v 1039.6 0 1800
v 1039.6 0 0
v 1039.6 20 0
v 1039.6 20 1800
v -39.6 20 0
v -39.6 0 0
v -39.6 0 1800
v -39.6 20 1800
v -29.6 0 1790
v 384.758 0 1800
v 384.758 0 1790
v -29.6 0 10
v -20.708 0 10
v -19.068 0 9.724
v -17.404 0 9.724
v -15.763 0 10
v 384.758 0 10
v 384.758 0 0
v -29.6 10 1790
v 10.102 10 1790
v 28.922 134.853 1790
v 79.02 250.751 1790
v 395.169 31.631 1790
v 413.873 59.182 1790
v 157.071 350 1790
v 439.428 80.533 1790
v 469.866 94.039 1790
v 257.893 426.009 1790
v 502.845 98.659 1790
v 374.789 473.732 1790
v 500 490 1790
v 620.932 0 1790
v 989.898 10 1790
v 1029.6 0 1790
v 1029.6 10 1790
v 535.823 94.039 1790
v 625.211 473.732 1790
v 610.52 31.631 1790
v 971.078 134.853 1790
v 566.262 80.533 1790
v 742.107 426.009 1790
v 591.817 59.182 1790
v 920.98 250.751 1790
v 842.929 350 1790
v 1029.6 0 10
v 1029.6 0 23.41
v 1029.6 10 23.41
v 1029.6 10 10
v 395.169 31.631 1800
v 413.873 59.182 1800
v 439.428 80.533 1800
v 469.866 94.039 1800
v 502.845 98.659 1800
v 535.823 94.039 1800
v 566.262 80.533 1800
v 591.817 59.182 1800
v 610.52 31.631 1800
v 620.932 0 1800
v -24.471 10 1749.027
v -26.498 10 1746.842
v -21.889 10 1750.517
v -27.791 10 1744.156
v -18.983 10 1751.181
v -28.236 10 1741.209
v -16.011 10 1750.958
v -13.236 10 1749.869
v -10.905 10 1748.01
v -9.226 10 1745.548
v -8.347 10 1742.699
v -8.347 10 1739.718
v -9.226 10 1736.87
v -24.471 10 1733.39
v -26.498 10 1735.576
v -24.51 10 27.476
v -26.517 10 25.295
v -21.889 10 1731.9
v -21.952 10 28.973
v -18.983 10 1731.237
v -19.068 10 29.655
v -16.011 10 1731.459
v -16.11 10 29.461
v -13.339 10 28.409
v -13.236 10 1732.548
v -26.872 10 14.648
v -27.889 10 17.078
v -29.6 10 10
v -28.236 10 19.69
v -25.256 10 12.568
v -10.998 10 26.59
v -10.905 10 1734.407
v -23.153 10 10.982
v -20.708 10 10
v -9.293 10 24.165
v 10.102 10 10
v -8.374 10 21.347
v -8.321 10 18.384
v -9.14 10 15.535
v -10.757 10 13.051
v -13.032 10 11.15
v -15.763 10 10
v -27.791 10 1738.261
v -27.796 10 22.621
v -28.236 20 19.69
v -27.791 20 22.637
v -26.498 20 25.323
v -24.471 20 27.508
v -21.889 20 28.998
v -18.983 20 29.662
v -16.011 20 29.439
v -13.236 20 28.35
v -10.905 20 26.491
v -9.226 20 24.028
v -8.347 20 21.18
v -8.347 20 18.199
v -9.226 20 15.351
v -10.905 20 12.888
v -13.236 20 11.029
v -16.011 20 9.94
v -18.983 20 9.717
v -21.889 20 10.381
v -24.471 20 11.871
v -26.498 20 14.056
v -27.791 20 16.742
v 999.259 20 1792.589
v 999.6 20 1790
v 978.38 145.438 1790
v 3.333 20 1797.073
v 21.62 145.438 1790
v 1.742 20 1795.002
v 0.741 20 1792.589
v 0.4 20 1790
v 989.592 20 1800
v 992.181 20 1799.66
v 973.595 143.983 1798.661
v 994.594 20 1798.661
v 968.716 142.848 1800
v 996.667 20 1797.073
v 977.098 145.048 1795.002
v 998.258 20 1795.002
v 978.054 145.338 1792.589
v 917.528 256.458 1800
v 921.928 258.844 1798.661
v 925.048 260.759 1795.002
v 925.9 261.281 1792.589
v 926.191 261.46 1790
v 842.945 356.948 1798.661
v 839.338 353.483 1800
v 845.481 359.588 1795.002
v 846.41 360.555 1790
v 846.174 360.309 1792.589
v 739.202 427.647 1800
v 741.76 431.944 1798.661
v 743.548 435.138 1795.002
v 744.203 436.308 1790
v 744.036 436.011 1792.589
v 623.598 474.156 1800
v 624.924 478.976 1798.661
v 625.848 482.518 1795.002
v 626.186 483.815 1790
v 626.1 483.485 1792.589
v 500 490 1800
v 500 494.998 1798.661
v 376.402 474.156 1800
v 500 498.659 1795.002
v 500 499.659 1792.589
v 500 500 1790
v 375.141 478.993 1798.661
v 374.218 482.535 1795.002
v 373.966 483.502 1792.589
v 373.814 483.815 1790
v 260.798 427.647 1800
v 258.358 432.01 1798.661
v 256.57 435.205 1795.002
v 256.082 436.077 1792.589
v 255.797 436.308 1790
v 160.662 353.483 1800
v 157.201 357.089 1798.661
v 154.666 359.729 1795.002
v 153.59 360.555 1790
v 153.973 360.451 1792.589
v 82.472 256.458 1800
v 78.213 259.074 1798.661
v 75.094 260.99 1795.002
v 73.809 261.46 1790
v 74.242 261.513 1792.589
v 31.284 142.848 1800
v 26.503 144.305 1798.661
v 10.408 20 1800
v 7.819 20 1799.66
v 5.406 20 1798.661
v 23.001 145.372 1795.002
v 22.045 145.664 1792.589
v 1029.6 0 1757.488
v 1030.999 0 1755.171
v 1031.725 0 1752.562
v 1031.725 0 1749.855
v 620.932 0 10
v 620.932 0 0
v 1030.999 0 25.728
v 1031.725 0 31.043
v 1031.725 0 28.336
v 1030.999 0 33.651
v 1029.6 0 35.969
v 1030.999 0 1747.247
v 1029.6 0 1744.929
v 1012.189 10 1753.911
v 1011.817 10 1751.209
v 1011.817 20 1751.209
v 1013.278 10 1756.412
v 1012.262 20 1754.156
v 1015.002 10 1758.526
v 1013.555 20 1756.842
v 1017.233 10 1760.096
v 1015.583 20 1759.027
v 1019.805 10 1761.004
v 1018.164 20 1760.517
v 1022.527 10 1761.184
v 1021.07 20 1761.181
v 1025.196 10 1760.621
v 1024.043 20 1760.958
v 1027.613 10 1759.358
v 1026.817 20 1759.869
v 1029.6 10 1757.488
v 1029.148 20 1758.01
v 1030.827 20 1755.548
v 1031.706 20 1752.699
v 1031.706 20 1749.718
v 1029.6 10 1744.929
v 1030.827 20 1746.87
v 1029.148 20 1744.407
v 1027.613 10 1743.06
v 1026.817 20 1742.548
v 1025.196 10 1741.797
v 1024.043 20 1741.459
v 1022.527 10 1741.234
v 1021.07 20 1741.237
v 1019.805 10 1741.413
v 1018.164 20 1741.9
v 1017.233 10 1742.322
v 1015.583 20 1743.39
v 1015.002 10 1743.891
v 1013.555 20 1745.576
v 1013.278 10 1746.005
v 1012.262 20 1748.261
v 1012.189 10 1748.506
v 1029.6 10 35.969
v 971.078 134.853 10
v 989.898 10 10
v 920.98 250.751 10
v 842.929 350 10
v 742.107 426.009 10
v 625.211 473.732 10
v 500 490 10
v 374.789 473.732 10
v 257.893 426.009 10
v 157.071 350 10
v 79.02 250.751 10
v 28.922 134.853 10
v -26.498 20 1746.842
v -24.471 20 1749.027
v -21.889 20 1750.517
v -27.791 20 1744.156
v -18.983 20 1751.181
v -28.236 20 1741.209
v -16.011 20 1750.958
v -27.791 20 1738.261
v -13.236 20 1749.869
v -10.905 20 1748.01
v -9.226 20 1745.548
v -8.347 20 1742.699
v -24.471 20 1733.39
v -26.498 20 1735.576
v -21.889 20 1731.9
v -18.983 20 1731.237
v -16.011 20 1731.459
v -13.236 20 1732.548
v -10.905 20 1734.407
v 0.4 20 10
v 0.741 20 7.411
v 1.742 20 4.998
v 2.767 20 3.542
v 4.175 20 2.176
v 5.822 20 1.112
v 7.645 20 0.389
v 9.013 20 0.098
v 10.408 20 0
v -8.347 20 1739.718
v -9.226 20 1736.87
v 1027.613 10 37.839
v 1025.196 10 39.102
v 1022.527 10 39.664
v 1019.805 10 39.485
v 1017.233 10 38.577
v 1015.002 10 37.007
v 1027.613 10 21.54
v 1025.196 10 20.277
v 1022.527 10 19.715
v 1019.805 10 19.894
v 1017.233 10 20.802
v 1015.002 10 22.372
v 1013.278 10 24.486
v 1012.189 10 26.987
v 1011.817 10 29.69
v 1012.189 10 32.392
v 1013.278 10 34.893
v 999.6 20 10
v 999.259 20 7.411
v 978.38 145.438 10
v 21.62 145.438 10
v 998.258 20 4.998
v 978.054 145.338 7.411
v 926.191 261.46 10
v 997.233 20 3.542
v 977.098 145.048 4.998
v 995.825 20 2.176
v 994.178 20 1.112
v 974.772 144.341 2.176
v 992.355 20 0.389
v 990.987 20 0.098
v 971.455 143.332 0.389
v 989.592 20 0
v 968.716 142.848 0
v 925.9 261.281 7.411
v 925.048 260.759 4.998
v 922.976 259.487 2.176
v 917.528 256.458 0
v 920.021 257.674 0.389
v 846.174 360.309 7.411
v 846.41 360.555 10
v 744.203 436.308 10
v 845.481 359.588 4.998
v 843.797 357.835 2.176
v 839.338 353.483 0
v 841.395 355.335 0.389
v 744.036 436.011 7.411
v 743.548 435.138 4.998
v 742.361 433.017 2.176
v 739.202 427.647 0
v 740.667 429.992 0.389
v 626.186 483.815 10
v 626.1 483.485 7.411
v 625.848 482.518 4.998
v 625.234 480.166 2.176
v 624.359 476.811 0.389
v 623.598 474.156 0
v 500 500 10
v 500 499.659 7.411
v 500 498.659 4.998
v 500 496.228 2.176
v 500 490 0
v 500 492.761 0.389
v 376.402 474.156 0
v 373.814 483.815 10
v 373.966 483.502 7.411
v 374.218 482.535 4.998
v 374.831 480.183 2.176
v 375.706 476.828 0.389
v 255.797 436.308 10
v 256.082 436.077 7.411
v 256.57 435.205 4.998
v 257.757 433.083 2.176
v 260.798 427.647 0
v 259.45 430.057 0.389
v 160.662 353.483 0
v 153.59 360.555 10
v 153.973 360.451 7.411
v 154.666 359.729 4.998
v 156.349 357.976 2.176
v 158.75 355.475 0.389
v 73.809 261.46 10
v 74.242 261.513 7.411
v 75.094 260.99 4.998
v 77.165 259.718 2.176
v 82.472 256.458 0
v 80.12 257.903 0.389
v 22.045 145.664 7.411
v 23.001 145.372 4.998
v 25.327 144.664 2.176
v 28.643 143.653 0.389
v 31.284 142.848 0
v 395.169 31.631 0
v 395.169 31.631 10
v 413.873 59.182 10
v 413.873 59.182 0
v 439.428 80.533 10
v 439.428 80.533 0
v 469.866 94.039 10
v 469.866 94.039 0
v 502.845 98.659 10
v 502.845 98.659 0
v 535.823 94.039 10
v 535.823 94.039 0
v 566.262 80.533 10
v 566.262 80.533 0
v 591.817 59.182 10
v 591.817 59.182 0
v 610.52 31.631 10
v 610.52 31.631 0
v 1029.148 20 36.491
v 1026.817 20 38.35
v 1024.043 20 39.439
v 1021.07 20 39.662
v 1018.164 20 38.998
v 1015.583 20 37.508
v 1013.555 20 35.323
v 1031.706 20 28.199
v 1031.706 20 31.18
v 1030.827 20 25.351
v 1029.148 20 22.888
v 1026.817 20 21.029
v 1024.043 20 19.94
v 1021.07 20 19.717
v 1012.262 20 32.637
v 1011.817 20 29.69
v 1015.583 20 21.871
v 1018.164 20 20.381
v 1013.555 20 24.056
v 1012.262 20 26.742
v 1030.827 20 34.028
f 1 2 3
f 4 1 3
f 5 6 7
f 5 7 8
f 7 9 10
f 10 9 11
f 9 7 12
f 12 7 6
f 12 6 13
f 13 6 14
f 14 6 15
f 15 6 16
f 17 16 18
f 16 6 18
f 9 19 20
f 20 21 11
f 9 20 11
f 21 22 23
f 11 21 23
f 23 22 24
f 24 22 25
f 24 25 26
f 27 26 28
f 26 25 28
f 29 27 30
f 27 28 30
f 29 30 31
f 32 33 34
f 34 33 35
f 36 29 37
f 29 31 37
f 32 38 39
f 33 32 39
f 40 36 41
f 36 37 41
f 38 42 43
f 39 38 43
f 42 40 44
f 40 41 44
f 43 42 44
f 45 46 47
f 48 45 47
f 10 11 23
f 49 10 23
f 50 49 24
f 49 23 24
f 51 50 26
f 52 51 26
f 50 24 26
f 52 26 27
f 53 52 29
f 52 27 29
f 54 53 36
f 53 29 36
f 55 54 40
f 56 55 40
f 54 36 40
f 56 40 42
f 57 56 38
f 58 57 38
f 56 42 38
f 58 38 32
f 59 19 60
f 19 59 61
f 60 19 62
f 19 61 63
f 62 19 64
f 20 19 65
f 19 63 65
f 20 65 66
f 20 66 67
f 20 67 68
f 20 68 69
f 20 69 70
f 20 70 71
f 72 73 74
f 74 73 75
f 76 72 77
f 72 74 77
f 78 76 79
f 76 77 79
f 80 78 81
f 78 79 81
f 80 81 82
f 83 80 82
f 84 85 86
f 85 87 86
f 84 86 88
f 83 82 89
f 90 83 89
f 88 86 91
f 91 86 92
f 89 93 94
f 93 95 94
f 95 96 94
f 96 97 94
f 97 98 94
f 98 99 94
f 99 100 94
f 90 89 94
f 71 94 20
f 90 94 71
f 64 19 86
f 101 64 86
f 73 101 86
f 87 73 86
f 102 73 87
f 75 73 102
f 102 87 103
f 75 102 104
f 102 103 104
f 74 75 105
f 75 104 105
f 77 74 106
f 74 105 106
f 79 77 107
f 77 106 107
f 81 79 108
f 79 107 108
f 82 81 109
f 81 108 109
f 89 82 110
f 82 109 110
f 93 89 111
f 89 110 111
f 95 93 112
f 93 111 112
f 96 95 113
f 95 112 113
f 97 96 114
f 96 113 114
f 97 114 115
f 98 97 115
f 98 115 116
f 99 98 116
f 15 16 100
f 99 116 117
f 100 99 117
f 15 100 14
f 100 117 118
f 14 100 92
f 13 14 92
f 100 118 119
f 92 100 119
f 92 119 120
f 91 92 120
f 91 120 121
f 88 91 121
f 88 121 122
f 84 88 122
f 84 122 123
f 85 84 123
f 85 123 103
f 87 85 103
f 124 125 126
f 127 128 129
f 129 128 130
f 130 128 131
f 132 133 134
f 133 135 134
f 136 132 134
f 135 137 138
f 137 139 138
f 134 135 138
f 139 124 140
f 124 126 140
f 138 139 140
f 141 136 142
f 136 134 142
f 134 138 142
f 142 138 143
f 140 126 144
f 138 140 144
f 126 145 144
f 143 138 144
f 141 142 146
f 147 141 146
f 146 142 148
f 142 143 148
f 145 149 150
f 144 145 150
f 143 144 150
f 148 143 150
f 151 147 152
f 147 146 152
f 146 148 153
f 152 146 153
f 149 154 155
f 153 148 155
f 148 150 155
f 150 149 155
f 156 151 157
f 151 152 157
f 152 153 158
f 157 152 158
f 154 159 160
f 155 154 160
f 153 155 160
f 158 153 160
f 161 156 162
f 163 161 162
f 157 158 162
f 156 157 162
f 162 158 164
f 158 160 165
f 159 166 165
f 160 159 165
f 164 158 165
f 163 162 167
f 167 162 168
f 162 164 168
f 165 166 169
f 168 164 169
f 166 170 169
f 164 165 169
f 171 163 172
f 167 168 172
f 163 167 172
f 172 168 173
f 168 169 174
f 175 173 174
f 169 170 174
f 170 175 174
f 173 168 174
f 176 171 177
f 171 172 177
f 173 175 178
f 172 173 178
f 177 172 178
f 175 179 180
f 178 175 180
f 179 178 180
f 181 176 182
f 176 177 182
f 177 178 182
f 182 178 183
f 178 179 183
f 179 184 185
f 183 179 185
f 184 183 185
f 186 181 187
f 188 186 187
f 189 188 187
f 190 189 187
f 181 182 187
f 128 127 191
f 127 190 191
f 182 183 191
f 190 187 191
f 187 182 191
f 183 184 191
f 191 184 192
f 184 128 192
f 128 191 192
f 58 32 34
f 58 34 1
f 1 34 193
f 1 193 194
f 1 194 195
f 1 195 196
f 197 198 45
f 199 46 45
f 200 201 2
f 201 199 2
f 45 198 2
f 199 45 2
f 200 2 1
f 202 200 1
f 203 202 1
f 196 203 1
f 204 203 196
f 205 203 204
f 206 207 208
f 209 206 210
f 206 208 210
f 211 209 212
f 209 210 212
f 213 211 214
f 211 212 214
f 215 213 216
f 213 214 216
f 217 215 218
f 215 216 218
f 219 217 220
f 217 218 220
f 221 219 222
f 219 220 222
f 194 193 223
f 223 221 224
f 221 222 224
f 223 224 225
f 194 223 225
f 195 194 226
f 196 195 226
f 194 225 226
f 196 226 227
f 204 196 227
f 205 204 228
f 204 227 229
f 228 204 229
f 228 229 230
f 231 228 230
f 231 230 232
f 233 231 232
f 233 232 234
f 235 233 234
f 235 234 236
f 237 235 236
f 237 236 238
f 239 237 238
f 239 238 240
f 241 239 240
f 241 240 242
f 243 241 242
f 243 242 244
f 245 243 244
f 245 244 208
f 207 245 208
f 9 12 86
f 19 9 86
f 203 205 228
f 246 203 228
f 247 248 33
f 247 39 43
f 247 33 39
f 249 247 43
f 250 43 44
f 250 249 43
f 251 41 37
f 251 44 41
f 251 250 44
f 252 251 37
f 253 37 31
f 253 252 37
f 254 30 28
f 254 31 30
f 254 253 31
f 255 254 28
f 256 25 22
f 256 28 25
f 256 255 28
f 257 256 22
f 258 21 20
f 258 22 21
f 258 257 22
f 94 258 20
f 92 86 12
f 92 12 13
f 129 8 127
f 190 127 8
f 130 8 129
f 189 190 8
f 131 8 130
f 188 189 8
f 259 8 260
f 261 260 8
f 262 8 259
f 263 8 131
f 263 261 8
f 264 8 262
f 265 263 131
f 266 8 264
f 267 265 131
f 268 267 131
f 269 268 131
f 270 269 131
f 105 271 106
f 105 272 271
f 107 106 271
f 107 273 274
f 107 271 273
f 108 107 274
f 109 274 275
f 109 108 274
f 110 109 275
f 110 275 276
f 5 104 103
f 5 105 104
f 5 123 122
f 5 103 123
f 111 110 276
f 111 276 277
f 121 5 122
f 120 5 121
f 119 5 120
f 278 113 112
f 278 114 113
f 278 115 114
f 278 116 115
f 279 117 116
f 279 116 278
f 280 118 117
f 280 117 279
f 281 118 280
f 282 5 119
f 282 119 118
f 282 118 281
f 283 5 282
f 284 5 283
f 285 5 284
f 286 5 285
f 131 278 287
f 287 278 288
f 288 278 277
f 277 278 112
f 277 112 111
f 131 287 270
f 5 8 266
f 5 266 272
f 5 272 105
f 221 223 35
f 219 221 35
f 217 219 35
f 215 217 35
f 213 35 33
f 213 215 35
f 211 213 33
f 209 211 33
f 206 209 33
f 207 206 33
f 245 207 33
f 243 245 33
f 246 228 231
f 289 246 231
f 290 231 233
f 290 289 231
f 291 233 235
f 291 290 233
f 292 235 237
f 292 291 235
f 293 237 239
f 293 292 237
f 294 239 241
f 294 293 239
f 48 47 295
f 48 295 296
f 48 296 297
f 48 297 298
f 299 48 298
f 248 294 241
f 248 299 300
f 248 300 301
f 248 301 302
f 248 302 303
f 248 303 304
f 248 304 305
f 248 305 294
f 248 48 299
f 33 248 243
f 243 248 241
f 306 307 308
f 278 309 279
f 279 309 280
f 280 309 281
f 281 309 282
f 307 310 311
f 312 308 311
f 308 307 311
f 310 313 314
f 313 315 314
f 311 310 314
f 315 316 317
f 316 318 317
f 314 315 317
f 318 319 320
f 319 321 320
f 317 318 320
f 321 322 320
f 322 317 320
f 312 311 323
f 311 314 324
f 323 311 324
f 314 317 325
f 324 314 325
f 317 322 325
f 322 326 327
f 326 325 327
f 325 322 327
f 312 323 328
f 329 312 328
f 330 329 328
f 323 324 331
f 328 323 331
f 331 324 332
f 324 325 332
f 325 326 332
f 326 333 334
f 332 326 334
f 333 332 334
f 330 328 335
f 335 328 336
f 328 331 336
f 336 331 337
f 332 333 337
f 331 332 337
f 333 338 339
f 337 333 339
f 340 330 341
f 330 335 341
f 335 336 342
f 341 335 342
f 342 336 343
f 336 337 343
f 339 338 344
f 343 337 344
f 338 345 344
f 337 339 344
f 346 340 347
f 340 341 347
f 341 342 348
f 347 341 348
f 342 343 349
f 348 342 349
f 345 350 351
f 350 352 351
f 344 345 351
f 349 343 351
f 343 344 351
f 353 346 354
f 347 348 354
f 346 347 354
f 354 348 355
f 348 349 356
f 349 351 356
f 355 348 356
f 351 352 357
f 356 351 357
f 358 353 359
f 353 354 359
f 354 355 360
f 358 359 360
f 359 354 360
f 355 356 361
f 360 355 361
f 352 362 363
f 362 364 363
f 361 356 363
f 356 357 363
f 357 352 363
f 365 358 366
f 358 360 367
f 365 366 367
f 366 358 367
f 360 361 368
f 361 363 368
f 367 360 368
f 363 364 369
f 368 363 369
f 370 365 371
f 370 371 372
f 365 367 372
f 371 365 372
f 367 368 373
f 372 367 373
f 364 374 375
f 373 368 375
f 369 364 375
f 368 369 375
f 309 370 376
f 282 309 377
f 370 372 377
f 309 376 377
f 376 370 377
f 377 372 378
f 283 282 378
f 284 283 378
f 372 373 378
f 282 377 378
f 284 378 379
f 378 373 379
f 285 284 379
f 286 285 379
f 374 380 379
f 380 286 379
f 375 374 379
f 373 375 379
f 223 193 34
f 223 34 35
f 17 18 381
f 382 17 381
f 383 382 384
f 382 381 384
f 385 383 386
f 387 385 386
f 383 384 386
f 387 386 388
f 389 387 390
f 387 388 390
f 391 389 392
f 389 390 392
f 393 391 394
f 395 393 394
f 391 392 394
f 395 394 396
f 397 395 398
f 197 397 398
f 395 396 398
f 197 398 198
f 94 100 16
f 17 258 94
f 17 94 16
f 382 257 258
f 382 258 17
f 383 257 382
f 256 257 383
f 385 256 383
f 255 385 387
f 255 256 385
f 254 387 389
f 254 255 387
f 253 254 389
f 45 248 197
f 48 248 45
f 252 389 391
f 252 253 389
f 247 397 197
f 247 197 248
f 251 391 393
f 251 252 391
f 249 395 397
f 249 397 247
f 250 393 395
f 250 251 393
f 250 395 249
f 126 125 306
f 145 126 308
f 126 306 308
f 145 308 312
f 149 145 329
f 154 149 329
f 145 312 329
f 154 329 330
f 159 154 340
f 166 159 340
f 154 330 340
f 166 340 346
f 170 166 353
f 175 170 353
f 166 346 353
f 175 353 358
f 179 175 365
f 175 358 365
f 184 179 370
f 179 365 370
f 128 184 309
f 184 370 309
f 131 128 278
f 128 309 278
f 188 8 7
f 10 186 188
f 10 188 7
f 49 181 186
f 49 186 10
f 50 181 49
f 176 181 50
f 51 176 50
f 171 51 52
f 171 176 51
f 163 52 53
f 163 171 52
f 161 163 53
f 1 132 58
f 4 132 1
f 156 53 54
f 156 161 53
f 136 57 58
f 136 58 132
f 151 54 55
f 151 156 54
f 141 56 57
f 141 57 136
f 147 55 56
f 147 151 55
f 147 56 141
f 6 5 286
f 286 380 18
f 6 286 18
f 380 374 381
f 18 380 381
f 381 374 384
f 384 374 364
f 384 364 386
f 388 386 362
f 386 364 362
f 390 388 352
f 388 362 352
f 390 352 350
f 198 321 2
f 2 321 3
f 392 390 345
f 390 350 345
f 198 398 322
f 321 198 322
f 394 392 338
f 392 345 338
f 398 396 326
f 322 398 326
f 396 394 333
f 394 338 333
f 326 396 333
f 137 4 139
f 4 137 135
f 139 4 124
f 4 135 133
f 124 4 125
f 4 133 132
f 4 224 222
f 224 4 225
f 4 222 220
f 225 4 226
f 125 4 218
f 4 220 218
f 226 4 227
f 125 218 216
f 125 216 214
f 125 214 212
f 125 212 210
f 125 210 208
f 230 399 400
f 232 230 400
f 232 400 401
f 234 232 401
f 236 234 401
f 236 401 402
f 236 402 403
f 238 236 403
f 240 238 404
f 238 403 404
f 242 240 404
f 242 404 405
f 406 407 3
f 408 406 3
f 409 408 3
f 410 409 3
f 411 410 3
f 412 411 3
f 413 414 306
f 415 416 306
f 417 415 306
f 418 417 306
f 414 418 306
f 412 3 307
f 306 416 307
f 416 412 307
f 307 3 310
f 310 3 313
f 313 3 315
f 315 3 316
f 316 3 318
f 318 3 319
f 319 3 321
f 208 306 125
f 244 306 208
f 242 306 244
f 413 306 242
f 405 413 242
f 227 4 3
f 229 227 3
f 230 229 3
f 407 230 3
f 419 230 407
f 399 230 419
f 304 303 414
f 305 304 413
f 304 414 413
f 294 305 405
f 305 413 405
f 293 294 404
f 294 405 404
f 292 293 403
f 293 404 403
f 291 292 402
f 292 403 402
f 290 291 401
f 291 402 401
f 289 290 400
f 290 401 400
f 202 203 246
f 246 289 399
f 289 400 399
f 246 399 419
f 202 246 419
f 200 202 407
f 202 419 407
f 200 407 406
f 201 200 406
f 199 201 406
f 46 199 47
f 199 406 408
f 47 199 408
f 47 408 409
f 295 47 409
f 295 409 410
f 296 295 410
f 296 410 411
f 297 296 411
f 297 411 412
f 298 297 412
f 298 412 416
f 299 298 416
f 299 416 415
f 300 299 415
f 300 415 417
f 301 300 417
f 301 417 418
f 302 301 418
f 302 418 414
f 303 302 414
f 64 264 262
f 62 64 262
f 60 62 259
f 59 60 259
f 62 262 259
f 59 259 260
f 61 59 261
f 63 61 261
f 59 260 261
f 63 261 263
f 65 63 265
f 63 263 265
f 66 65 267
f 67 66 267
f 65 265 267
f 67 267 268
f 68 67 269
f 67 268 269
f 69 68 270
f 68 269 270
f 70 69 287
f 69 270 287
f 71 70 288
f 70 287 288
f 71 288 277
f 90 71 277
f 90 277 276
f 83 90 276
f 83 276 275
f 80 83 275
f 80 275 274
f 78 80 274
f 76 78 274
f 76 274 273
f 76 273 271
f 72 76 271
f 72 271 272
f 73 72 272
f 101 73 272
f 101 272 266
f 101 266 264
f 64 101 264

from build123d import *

# Parameters (mm, degrees)
BOSS_EXTRUDE1_DEPTH = 1800
BOSS_EXTRUDE2_DEPTH = 1800
SHELL1_T            = -10
FILLET1_R           = 10
SKETCH3_R           = 10
CUT_EXTRUDE1_DEPTH  = 2134.346626248


with BuildPart() as part:
    # Sketch1 → Boss-Extrude1 (new body)
    with BuildSketch(Plane.XY):
        with BuildLine():
            Line((0, 0), (384.757529665, 0))
            ThreePointArc((384.757529665, 0), (502.844648307, 98.659137532), (620.931766949, 0))
            Line((620.931766949, 0), (1000, 0))
            ThreePointArc((1000, 0), (500, 500), (0, 0))
        make_face()
    extrude(amount=BOSS_EXTRUDE1_DEPTH)

    # Sketch2 → Boss-Extrude2 (add)
    with BuildSketch(Plane.XY):
        Polygon((1000, 0), (1039.599839872, 0), (1039.599839872, 20), (999.599839872, 20), align=None)
        Polygon((0, 0), (-39.599839872, 0), (-39.599839872, 20), (0.400160128, 20), align=None)
    extrude(amount=BOSS_EXTRUDE2_DEPTH)

    # Shell1
    shell1_openings = [part.faces().sort_by_distance(p)[0] for p in [
        (830.265803411, 0, 900),
        (502.844648307, 98.659137532, 900),
        (172.578844897, 0, 900),
    ]]
    offset(amount=SHELL1_T, openings=shell1_openings, kind=Kind.INTERSECTION)

    # Fillet1
    fillet1_edges = [part.edges().sort_by_distance(p)[0] for p in [
        (500, 500, 0),
        (500, 500, 1800),
    ]]
    fillet(fillet1_edges, radius=FILLET1_R)

    # Sketch3 → Cut-Extrude1 (cut, through all)
    with BuildSketch(Plane(origin=(0, 20, 0), x_dir=(1, 0, 0), z_dir=(0, 1, 0))):
        with Locations(Location((-18.235719302, -19.68953089, 0), (0, 0, 180))):
            Circle(SKETCH3_R)
        with Locations(Location((1021.817467904, -29.68953089, 0), (0, 0, 180))):
            Circle(SKETCH3_R)
        with Locations(Location((1021.817467904, -1751.208740349, 0), (0, 0, 180))):
            Circle(SKETCH3_R)
        with Locations(Location((-18.235719302, -1741.208740349, 0), (0, 0, 180))):
            Circle(SKETCH3_R)
    extrude(amount=-CUT_EXTRUDE1_DEPTH, mode=Mode.SUBTRACT)


solid = part.part
